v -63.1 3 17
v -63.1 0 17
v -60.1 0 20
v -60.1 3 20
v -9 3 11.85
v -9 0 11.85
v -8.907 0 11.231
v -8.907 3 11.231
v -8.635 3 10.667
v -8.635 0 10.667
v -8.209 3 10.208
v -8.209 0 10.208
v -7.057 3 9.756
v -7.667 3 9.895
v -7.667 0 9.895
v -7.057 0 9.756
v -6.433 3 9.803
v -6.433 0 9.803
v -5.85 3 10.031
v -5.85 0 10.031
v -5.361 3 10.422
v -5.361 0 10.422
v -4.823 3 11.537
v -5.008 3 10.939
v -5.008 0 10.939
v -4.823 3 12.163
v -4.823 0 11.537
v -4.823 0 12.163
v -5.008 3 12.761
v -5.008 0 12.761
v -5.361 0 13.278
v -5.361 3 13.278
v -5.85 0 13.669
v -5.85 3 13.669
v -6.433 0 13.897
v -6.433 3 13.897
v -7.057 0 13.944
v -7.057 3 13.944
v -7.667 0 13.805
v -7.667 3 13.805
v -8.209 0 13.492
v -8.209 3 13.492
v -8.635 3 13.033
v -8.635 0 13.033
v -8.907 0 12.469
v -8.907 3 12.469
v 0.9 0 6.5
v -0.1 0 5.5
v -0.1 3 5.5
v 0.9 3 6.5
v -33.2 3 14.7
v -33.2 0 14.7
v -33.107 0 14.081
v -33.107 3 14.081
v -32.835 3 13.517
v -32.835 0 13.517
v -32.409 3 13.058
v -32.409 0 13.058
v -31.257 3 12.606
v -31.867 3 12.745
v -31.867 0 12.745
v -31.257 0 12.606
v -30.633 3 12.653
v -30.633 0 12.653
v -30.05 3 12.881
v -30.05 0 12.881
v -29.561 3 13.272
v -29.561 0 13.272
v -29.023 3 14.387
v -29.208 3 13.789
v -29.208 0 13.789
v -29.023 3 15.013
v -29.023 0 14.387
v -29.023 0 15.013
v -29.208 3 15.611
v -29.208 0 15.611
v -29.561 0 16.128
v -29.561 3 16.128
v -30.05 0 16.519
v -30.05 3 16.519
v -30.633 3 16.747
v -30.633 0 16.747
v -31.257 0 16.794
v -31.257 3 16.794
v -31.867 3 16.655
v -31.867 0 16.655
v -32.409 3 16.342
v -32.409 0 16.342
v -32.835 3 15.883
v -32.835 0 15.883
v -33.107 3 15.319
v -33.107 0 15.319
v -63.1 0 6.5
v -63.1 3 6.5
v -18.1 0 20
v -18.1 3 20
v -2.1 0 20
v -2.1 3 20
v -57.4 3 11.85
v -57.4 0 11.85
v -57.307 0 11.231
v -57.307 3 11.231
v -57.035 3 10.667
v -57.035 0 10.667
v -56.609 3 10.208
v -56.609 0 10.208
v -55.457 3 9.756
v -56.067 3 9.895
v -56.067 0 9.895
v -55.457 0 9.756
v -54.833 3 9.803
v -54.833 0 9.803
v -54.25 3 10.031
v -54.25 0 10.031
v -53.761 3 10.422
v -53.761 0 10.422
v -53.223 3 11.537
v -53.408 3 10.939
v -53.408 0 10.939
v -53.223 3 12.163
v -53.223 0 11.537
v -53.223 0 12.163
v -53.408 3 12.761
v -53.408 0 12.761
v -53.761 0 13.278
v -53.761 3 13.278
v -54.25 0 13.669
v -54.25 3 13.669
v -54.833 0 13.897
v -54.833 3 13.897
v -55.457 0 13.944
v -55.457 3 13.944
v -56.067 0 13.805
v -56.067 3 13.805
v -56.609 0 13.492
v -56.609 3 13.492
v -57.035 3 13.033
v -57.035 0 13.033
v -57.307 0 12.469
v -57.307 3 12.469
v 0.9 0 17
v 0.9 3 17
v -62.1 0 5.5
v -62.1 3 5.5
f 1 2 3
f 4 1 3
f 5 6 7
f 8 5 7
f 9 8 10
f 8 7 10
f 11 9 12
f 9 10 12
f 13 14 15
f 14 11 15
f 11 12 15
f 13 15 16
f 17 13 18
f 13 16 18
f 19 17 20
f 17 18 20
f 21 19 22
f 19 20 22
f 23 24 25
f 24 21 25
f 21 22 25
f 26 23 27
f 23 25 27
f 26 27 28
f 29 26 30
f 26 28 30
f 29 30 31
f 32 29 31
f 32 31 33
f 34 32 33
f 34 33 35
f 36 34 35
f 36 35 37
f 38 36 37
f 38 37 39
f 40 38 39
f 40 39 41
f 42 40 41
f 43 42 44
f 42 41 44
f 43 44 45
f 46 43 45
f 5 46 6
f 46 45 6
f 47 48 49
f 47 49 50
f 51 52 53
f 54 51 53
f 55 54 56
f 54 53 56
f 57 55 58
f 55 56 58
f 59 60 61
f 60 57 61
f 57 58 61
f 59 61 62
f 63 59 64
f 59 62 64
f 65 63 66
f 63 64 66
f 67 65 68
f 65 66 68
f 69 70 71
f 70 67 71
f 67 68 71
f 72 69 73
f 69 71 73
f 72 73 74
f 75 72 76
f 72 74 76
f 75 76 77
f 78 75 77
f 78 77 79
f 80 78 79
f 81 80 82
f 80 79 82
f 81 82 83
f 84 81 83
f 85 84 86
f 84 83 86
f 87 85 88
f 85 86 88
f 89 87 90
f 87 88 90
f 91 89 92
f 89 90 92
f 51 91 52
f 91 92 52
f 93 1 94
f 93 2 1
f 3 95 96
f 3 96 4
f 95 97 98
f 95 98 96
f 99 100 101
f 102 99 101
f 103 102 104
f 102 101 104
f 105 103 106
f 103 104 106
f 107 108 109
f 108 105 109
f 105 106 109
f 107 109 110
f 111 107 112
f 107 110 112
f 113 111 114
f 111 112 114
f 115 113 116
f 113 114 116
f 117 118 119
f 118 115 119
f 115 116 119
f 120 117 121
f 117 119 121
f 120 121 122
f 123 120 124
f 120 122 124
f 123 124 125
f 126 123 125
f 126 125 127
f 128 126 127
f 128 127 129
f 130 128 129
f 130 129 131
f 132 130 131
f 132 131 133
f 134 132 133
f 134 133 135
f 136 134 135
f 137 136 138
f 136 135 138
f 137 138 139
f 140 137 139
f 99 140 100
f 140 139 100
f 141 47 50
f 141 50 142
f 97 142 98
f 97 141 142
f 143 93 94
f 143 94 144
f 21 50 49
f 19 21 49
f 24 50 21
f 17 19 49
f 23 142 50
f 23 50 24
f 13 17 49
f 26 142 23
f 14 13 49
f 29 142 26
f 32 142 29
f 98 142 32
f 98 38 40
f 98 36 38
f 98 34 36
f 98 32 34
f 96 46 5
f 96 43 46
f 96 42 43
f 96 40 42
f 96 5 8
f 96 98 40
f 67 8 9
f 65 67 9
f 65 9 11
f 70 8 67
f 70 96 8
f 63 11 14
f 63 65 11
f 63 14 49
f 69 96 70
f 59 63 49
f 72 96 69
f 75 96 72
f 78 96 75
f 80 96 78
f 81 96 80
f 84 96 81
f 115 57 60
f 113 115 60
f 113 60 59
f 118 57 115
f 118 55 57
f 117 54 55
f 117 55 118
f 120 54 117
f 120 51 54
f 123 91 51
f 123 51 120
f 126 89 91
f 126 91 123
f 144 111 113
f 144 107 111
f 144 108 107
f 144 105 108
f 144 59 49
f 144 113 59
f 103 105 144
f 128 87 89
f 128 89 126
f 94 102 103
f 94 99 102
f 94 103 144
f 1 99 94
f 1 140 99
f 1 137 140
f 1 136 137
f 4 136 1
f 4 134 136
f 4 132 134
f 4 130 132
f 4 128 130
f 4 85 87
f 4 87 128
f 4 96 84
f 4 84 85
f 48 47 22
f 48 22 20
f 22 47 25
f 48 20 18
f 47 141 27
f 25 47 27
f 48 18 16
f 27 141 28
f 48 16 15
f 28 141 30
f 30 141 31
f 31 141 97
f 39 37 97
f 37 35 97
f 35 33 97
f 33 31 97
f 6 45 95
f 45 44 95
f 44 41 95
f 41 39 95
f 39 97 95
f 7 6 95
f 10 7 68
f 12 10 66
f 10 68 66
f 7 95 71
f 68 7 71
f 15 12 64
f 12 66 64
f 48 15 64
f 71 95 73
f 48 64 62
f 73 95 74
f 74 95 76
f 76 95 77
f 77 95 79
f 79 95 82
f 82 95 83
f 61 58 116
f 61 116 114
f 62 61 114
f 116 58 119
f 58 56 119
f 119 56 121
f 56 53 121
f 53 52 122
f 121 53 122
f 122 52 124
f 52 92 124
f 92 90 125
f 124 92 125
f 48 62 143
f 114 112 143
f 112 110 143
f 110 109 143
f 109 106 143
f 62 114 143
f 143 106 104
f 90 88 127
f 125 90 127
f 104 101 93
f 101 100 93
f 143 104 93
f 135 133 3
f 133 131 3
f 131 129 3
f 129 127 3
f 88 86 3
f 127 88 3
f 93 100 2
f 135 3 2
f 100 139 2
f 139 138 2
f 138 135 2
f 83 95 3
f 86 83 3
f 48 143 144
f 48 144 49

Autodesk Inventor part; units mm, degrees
ref_plane "YZ Plane" through (0, 0, 0) normal (1, 0, 0) x (0, 1, 0)
ref_plane "XZ Plane" through (0, 0, 0) normal (0, 1, 0) x (-1, 0, 0)
ref_plane "XY Plane" through (0, 0, 0) normal (0, 0, 1) x (1, 0, 0)
sketch "スケッチ1" plane through (0, 0, 0) normal (0, 1, 0) x (-1, 0, 0)
  circle A0 centre (55.3, 11.85) radius 2.1
  circle A1 centre (31.1, 14.7) radius 2.1
  circle A2 centre (6.9, 11.85) radius 2.1
  line L0 (62.1, 5.5) -> (0.1, 5.5)
  line L1 (2.1, 20) -> (60.1, 20)
  line L2 (2.1, 20) -> (18.1, 20)
  line L3 (-0.9, 6.5) -> (-0.9, 17)
  line L4 (63.1, 17) -> (63.1, 6.5)
  line L5 (63.1, 17) -> (60.1, 20)
  line L6 (-0.9, 17) -> (2.1, 20)
  line L7 (63.1, 6.5) -> (62.1, 5.5)
  line L8 (0.1, 5.5) -> (-0.9, 6.5)
  point P0 (0, 0)
  point P1 (-0.9, 5.5)
  point P2 (-0.9, 20)
  point P3 (63.1, 20)
  point P4 (63.1, 5.5)
  dimension "d0" = 64
  dimension "d2" = 14.5
  dimension "d3" = 4.2
  dimension "d4" = 4.2
  dimension "d5" = 4.2
  dimension "d8" = 3
  dimension "d9" = 3
  dimension "d10" = 3
  dimension "d11" = 3
  dimension "d12" = 1
  dimension "d13" = 1
  dimension "d14" = 1
  dimension "d15" = 1
extrude "押し出し1" add sketch "スケッチ1" along normal blind 3
equation "\"d4\" = d3"
equation "\"d5\" = d4"
equation "\"d9\" = d8"
equation "\"d10\" = d8"
equation "\"d11\" = d10"
equation "\"d13\" = d12"
equation "\"d14\" = d12"
equation "\"d15\" = d14"
properties part number "stopperver2_1"
